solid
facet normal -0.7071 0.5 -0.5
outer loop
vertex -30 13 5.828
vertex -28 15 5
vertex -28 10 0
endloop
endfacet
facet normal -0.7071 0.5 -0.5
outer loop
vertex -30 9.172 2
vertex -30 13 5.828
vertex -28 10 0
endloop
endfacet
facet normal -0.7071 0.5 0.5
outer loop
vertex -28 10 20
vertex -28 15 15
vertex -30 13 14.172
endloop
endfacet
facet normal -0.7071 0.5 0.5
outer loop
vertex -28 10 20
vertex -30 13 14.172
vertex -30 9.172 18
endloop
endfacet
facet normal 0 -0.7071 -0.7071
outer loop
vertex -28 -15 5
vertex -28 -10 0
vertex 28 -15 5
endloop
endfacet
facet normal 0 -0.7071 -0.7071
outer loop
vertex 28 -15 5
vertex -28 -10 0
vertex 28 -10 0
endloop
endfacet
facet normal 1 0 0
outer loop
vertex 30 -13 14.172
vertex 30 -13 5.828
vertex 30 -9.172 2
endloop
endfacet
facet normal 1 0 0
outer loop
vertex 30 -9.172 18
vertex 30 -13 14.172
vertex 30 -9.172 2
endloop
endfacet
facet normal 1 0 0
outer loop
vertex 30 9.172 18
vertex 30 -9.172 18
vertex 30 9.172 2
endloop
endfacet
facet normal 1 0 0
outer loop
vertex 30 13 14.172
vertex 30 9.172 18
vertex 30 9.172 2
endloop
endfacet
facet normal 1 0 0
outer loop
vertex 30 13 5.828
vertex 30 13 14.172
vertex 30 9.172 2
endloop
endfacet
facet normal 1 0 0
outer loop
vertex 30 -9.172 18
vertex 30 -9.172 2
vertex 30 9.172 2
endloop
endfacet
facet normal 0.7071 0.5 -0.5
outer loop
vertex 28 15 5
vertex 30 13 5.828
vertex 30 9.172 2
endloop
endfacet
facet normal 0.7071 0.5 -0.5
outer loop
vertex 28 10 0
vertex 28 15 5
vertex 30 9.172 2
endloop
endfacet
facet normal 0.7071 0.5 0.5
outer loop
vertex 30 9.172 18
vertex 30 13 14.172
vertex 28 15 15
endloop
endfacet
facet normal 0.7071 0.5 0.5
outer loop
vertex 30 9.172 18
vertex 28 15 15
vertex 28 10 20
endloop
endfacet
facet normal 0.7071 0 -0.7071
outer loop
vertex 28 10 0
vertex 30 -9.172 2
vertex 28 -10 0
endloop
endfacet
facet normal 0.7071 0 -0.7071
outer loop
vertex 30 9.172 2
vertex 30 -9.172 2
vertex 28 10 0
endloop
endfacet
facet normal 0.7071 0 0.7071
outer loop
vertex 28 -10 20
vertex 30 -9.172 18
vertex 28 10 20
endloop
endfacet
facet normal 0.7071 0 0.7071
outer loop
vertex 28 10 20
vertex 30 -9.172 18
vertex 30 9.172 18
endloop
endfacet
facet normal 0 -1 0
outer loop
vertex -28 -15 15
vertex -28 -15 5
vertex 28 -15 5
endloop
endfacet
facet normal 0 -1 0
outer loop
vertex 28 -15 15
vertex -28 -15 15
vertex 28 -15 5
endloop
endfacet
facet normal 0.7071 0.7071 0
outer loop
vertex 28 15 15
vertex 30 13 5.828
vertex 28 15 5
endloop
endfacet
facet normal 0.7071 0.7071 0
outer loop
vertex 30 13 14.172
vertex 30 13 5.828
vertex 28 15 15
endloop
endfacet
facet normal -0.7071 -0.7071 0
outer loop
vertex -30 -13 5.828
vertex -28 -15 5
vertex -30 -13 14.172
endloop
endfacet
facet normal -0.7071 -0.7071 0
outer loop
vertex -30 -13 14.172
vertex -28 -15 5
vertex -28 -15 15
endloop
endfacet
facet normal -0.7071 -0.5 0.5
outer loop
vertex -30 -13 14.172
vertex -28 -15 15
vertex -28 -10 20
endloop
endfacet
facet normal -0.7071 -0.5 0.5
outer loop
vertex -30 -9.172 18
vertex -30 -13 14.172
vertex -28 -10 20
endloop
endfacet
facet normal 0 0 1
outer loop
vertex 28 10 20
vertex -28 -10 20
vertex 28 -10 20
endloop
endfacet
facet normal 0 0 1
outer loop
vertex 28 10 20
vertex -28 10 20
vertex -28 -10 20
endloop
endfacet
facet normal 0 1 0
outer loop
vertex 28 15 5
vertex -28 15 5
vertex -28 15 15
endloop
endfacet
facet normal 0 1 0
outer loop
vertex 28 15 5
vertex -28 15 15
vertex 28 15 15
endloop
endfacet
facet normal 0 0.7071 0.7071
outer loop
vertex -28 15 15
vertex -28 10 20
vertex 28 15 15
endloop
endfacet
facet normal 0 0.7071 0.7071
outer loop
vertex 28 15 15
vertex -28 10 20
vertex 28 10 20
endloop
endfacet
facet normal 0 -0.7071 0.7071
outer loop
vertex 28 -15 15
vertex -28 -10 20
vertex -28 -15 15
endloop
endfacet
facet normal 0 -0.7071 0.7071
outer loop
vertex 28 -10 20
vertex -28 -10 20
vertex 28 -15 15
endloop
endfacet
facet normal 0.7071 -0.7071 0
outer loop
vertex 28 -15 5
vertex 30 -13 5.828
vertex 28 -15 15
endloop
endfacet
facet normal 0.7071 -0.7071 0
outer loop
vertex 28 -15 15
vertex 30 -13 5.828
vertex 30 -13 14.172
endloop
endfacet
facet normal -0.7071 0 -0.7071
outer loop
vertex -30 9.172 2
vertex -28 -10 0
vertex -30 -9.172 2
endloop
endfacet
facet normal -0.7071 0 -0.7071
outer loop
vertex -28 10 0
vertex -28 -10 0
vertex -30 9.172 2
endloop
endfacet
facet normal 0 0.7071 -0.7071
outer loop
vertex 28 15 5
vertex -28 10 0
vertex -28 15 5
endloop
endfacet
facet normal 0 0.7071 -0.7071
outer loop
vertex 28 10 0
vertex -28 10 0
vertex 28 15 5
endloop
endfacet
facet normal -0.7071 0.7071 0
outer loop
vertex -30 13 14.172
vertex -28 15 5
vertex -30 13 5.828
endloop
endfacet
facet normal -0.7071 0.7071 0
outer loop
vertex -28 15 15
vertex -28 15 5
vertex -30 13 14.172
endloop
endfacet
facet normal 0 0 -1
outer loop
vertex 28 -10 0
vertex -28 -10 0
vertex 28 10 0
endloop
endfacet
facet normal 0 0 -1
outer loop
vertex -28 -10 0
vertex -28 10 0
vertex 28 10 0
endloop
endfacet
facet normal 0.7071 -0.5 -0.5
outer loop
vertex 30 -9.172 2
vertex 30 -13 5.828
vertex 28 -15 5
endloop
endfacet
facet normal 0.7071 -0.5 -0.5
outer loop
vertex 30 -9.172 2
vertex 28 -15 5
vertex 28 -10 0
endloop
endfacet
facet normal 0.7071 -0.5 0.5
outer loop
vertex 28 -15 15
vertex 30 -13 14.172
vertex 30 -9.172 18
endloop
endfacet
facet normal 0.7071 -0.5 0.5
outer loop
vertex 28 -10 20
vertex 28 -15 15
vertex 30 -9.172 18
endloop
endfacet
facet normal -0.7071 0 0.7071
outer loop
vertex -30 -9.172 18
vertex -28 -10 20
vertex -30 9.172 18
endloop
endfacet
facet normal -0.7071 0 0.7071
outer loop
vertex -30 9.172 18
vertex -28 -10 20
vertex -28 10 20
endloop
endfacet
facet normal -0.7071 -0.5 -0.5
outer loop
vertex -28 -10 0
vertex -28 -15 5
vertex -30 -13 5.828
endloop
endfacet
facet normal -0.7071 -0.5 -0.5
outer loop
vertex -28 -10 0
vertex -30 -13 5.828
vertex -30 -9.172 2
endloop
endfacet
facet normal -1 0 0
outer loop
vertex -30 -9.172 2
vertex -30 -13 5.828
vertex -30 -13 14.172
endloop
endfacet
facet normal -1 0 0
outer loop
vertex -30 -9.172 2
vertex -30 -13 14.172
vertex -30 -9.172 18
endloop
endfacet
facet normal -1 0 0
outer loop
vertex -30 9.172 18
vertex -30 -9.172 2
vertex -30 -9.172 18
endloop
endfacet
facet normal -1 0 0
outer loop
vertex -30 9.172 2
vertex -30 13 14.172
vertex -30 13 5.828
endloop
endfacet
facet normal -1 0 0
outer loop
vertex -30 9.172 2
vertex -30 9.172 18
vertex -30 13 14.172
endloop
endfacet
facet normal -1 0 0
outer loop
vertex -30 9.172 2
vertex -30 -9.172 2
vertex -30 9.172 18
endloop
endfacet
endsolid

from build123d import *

# Parameters (mm, degrees)
F0_W     = 60
F0_H     = 30
F1_DEPTH = 20
F2_SIZE  = 5
F3_SIZE  = 2


with BuildPart() as f1:
    # F0 (on Top) → F1 (new body)
    with BuildSketch(Plane.XY):
        Rectangle(F0_W, F0_H)
    extrude(amount=F1_DEPTH)

    # F2
    f2_edges = [f1.edges().sort_by_distance(p)[0] for p in [
        (0, -15, 20),
        (0, 15, 20),
        (0, -15, 0),
        (0, 15, 0),
    ]]
    chamfer(f2_edges, length=F2_SIZE)

    # F3
    f3_edges = [f1.edges().sort_by_distance(p)[0] for p in [
        (30, -15, 10),
        (30, -12.5, 2.5),
        (30, -12.5, 17.5),
        (30, 0, 0),
        (30, 0, 20),
        (30, 12.5, 2.5),
        (30, 12.5, 17.5),
        (30, 15, 10),
        (-30, 15, 10),
        (-30, 12.5, 2.5),
        (-30, 12.5, 17.5),
        (-30, 0, 0),
        (-30, 0, 20),
        (-30, -12.5, 2.5),
        (-30, -12.5, 17.5),
        (-30, -15, 10),
    ]]
    chamfer(f3_edges, length=F3_SIZE)


solid = f1.part
